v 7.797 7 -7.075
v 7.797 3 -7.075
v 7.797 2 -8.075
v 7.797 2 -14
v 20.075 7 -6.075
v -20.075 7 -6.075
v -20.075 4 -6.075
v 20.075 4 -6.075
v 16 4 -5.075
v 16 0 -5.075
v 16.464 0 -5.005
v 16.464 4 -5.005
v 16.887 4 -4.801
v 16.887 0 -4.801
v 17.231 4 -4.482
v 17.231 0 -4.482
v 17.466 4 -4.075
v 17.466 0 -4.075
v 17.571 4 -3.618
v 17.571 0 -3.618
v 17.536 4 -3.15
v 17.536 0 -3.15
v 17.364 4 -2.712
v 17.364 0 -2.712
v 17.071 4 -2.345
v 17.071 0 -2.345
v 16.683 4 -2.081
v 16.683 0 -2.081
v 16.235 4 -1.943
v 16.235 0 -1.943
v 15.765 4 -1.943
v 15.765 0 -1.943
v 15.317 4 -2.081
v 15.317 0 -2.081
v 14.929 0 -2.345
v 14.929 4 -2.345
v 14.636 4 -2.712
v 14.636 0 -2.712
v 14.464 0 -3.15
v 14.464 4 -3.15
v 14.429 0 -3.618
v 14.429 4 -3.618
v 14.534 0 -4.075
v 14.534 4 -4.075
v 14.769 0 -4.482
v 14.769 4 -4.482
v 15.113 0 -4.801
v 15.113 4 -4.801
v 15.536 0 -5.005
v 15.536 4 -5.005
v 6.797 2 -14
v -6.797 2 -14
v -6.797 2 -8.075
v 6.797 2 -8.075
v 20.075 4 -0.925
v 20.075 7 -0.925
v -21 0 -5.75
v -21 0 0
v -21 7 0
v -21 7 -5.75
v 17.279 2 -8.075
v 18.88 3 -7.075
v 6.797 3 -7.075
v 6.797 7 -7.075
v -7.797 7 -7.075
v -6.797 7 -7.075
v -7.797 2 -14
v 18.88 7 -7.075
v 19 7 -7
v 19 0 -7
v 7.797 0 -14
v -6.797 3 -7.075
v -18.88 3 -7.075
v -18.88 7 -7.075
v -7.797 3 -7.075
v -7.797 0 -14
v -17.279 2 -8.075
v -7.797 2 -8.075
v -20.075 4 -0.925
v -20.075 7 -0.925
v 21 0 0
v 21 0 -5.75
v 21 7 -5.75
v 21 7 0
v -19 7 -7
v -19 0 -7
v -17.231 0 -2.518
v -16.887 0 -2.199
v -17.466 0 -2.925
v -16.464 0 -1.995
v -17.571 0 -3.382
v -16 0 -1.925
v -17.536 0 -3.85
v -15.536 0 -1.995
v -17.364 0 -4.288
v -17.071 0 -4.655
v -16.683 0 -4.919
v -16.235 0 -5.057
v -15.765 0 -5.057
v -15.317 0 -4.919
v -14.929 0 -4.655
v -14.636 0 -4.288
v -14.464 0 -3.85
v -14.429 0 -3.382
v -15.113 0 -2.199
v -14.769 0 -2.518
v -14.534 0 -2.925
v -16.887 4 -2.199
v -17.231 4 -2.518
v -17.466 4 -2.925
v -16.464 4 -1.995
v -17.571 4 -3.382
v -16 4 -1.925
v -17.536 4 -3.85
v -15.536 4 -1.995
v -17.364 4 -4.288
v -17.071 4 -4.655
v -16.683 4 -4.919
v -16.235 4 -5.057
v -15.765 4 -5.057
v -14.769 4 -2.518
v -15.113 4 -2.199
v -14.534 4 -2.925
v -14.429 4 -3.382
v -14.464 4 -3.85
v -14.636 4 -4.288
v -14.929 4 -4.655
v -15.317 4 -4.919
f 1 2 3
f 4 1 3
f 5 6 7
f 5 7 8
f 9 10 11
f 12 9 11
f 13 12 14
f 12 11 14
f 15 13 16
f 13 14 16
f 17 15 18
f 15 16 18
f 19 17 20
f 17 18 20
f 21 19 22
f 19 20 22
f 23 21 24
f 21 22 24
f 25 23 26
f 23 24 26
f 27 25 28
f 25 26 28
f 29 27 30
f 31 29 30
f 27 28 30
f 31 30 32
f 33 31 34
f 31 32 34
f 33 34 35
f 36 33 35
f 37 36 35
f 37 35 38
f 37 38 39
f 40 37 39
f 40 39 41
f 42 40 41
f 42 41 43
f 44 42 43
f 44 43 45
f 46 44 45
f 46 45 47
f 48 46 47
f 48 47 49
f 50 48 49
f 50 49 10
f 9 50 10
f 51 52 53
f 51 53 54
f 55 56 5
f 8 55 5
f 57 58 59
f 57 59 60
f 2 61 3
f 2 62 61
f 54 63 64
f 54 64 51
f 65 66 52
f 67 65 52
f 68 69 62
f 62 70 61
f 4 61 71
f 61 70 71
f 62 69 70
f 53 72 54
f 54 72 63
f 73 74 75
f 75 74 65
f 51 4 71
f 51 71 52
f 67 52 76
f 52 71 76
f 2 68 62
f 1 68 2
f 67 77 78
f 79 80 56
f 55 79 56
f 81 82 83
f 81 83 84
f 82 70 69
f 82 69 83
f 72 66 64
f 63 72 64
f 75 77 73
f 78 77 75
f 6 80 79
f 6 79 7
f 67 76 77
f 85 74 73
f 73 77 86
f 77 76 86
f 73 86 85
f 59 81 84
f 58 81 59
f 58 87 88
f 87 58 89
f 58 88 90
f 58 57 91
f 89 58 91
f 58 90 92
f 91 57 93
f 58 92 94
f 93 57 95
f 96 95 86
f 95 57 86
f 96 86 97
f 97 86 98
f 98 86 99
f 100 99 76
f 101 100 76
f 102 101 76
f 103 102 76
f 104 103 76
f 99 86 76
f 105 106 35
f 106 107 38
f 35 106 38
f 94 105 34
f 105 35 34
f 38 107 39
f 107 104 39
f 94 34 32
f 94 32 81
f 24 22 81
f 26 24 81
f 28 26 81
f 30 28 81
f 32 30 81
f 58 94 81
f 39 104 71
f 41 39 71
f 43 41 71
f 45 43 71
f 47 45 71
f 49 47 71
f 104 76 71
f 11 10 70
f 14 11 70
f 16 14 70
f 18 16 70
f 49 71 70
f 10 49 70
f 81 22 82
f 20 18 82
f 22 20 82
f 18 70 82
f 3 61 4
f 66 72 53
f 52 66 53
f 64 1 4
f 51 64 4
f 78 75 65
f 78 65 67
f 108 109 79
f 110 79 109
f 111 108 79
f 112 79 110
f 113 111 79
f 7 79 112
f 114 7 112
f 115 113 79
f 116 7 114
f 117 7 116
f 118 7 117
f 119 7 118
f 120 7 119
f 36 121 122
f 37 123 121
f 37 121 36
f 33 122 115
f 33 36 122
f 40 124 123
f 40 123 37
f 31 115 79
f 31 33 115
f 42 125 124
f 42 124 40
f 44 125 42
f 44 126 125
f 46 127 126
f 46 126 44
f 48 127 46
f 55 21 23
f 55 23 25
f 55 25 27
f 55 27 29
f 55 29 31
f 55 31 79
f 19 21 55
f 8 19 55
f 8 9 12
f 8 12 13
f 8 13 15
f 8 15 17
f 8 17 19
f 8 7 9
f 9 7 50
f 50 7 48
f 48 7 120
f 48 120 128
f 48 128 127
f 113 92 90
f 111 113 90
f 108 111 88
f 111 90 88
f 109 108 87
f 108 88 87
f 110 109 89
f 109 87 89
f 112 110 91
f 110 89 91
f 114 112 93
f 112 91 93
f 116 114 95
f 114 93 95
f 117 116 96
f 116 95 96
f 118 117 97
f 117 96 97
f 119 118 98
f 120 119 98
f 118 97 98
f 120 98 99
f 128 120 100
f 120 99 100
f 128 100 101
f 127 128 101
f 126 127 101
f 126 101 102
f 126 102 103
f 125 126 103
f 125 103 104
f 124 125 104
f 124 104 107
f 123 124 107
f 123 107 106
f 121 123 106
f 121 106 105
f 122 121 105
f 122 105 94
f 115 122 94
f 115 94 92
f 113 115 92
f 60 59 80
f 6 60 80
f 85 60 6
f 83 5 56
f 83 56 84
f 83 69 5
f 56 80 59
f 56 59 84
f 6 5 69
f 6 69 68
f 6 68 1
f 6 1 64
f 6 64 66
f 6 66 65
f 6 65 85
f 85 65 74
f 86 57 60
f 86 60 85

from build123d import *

# Parameters (mm, degrees)
RISER_DEPTH             = 7
SKETCH2_R               = 1.575
MOUNTING_HOLES_DEPTH    = 24.216373532
SKETCH3_W               = 40.15
SKETCH3_H               = 5.15
RECESS_DEPTH            = 3
FLANGE_DEPTH            = 7
SKETCH5_W               = 13.594480272
SKETCH5_H               = 6.925
FLANGE_CUTOUT_DEPTH     = 5
ANGLE_CUTOUT_DEPTH      = 32.901199964
ANGLE_CUTOUT_DEPTH_BACK = 32.901199964
FLANGE_CHAMFER_SIZE     = 1


with BuildPart() as part:
    # Sketch1 → Riser (new body)
    with BuildSketch(Plane(origin=(0, 0, 0), x_dir=(1, 0, 0), z_dir=(0, 1, 0))):
        Polygon((-18.999581839, 7), (18.999581839, 7), (21, 5.75), (21, 0), (-21, 0), (-21, 5.75), align=None)
    extrude(amount=RISER_DEPTH)

    # Sketch2 → Mounting Holes (cut, through all)
    with BuildSketch(Plane.XZ):
        with Locations(Location((16, -3.5, 0), (0, 0, 270))):
            Circle(SKETCH2_R)
        with Locations(Location((-16, -3.5, 0), (0, 0, 90))):
            Circle(SKETCH2_R)
    extrude(amount=-MOUNTING_HOLES_DEPTH, mode=Mode.SUBTRACT)

    # Sketch3 → Recess (cut)
    with BuildSketch(Plane(origin=(0, 7, 0), x_dir=(1, 0, 0), z_dir=(0, 1, 0))):
        with Locations((0, 3.5)):
            Rectangle(SKETCH3_W, SKETCH3_H)
    extrude(amount=-RECESS_DEPTH, mode=Mode.SUBTRACT)

    # Sketch4 → Flange (add)
    with BuildSketch(Plane(origin=(0, 0, 0), x_dir=(1, 0, 0), z_dir=(0, 1, 0))):
        Polygon((-18.999581839, 7), (18.999581839, 7), (7.797240136, 14), (-7.797240136, 14), align=None)
    extrude(amount=FLANGE_DEPTH)

    # Sketch5 → Flange Cutout (cut)
    with BuildSketch(Plane(origin=(0, 7, 0), x_dir=(1, 0, 0), z_dir=(0, 1, 0))):
        with Locations((0, 10.5375)):
            Rectangle(SKETCH5_W, SKETCH5_H)
        Polygon((-18.879556749, 7.075), (-7.797240136, 7.075), (-7.797240136, 14), align=None)
        Polygon((7.797240136, 7.075), (7.797240136, 14), (18.879556749, 7.075), align=None)
    extrude(amount=-FLANGE_CUTOUT_DEPTH, mode=Mode.SUBTRACT)

    # Sketch7 → Angle Cutout (cut, two sides: drawn at the far end of the back side and taken through both)
    with BuildSketch(Plane.ZY.offset(-6.797240136).offset(-ANGLE_CUTOUT_DEPTH_BACK)):
        Polygon((-7.075, 7), (-14, 2), (-14, 7), align=None)
    extrude(amount=ANGLE_CUTOUT_DEPTH + ANGLE_CUTOUT_DEPTH_BACK, mode=Mode.SUBTRACT)

    # Flange Chamfer
    flange_chamfer_edges = [part.edges().sort_by_distance(p)[0] for p in [
        (13.338398442, 2, -7.075),
        (-13.338398442, 2, -7.075),
        (0, 2, -7.075),
    ]]
    chamfer(flange_chamfer_edges, length=FLANGE_CHAMFER_SIZE)


solid = part.part
